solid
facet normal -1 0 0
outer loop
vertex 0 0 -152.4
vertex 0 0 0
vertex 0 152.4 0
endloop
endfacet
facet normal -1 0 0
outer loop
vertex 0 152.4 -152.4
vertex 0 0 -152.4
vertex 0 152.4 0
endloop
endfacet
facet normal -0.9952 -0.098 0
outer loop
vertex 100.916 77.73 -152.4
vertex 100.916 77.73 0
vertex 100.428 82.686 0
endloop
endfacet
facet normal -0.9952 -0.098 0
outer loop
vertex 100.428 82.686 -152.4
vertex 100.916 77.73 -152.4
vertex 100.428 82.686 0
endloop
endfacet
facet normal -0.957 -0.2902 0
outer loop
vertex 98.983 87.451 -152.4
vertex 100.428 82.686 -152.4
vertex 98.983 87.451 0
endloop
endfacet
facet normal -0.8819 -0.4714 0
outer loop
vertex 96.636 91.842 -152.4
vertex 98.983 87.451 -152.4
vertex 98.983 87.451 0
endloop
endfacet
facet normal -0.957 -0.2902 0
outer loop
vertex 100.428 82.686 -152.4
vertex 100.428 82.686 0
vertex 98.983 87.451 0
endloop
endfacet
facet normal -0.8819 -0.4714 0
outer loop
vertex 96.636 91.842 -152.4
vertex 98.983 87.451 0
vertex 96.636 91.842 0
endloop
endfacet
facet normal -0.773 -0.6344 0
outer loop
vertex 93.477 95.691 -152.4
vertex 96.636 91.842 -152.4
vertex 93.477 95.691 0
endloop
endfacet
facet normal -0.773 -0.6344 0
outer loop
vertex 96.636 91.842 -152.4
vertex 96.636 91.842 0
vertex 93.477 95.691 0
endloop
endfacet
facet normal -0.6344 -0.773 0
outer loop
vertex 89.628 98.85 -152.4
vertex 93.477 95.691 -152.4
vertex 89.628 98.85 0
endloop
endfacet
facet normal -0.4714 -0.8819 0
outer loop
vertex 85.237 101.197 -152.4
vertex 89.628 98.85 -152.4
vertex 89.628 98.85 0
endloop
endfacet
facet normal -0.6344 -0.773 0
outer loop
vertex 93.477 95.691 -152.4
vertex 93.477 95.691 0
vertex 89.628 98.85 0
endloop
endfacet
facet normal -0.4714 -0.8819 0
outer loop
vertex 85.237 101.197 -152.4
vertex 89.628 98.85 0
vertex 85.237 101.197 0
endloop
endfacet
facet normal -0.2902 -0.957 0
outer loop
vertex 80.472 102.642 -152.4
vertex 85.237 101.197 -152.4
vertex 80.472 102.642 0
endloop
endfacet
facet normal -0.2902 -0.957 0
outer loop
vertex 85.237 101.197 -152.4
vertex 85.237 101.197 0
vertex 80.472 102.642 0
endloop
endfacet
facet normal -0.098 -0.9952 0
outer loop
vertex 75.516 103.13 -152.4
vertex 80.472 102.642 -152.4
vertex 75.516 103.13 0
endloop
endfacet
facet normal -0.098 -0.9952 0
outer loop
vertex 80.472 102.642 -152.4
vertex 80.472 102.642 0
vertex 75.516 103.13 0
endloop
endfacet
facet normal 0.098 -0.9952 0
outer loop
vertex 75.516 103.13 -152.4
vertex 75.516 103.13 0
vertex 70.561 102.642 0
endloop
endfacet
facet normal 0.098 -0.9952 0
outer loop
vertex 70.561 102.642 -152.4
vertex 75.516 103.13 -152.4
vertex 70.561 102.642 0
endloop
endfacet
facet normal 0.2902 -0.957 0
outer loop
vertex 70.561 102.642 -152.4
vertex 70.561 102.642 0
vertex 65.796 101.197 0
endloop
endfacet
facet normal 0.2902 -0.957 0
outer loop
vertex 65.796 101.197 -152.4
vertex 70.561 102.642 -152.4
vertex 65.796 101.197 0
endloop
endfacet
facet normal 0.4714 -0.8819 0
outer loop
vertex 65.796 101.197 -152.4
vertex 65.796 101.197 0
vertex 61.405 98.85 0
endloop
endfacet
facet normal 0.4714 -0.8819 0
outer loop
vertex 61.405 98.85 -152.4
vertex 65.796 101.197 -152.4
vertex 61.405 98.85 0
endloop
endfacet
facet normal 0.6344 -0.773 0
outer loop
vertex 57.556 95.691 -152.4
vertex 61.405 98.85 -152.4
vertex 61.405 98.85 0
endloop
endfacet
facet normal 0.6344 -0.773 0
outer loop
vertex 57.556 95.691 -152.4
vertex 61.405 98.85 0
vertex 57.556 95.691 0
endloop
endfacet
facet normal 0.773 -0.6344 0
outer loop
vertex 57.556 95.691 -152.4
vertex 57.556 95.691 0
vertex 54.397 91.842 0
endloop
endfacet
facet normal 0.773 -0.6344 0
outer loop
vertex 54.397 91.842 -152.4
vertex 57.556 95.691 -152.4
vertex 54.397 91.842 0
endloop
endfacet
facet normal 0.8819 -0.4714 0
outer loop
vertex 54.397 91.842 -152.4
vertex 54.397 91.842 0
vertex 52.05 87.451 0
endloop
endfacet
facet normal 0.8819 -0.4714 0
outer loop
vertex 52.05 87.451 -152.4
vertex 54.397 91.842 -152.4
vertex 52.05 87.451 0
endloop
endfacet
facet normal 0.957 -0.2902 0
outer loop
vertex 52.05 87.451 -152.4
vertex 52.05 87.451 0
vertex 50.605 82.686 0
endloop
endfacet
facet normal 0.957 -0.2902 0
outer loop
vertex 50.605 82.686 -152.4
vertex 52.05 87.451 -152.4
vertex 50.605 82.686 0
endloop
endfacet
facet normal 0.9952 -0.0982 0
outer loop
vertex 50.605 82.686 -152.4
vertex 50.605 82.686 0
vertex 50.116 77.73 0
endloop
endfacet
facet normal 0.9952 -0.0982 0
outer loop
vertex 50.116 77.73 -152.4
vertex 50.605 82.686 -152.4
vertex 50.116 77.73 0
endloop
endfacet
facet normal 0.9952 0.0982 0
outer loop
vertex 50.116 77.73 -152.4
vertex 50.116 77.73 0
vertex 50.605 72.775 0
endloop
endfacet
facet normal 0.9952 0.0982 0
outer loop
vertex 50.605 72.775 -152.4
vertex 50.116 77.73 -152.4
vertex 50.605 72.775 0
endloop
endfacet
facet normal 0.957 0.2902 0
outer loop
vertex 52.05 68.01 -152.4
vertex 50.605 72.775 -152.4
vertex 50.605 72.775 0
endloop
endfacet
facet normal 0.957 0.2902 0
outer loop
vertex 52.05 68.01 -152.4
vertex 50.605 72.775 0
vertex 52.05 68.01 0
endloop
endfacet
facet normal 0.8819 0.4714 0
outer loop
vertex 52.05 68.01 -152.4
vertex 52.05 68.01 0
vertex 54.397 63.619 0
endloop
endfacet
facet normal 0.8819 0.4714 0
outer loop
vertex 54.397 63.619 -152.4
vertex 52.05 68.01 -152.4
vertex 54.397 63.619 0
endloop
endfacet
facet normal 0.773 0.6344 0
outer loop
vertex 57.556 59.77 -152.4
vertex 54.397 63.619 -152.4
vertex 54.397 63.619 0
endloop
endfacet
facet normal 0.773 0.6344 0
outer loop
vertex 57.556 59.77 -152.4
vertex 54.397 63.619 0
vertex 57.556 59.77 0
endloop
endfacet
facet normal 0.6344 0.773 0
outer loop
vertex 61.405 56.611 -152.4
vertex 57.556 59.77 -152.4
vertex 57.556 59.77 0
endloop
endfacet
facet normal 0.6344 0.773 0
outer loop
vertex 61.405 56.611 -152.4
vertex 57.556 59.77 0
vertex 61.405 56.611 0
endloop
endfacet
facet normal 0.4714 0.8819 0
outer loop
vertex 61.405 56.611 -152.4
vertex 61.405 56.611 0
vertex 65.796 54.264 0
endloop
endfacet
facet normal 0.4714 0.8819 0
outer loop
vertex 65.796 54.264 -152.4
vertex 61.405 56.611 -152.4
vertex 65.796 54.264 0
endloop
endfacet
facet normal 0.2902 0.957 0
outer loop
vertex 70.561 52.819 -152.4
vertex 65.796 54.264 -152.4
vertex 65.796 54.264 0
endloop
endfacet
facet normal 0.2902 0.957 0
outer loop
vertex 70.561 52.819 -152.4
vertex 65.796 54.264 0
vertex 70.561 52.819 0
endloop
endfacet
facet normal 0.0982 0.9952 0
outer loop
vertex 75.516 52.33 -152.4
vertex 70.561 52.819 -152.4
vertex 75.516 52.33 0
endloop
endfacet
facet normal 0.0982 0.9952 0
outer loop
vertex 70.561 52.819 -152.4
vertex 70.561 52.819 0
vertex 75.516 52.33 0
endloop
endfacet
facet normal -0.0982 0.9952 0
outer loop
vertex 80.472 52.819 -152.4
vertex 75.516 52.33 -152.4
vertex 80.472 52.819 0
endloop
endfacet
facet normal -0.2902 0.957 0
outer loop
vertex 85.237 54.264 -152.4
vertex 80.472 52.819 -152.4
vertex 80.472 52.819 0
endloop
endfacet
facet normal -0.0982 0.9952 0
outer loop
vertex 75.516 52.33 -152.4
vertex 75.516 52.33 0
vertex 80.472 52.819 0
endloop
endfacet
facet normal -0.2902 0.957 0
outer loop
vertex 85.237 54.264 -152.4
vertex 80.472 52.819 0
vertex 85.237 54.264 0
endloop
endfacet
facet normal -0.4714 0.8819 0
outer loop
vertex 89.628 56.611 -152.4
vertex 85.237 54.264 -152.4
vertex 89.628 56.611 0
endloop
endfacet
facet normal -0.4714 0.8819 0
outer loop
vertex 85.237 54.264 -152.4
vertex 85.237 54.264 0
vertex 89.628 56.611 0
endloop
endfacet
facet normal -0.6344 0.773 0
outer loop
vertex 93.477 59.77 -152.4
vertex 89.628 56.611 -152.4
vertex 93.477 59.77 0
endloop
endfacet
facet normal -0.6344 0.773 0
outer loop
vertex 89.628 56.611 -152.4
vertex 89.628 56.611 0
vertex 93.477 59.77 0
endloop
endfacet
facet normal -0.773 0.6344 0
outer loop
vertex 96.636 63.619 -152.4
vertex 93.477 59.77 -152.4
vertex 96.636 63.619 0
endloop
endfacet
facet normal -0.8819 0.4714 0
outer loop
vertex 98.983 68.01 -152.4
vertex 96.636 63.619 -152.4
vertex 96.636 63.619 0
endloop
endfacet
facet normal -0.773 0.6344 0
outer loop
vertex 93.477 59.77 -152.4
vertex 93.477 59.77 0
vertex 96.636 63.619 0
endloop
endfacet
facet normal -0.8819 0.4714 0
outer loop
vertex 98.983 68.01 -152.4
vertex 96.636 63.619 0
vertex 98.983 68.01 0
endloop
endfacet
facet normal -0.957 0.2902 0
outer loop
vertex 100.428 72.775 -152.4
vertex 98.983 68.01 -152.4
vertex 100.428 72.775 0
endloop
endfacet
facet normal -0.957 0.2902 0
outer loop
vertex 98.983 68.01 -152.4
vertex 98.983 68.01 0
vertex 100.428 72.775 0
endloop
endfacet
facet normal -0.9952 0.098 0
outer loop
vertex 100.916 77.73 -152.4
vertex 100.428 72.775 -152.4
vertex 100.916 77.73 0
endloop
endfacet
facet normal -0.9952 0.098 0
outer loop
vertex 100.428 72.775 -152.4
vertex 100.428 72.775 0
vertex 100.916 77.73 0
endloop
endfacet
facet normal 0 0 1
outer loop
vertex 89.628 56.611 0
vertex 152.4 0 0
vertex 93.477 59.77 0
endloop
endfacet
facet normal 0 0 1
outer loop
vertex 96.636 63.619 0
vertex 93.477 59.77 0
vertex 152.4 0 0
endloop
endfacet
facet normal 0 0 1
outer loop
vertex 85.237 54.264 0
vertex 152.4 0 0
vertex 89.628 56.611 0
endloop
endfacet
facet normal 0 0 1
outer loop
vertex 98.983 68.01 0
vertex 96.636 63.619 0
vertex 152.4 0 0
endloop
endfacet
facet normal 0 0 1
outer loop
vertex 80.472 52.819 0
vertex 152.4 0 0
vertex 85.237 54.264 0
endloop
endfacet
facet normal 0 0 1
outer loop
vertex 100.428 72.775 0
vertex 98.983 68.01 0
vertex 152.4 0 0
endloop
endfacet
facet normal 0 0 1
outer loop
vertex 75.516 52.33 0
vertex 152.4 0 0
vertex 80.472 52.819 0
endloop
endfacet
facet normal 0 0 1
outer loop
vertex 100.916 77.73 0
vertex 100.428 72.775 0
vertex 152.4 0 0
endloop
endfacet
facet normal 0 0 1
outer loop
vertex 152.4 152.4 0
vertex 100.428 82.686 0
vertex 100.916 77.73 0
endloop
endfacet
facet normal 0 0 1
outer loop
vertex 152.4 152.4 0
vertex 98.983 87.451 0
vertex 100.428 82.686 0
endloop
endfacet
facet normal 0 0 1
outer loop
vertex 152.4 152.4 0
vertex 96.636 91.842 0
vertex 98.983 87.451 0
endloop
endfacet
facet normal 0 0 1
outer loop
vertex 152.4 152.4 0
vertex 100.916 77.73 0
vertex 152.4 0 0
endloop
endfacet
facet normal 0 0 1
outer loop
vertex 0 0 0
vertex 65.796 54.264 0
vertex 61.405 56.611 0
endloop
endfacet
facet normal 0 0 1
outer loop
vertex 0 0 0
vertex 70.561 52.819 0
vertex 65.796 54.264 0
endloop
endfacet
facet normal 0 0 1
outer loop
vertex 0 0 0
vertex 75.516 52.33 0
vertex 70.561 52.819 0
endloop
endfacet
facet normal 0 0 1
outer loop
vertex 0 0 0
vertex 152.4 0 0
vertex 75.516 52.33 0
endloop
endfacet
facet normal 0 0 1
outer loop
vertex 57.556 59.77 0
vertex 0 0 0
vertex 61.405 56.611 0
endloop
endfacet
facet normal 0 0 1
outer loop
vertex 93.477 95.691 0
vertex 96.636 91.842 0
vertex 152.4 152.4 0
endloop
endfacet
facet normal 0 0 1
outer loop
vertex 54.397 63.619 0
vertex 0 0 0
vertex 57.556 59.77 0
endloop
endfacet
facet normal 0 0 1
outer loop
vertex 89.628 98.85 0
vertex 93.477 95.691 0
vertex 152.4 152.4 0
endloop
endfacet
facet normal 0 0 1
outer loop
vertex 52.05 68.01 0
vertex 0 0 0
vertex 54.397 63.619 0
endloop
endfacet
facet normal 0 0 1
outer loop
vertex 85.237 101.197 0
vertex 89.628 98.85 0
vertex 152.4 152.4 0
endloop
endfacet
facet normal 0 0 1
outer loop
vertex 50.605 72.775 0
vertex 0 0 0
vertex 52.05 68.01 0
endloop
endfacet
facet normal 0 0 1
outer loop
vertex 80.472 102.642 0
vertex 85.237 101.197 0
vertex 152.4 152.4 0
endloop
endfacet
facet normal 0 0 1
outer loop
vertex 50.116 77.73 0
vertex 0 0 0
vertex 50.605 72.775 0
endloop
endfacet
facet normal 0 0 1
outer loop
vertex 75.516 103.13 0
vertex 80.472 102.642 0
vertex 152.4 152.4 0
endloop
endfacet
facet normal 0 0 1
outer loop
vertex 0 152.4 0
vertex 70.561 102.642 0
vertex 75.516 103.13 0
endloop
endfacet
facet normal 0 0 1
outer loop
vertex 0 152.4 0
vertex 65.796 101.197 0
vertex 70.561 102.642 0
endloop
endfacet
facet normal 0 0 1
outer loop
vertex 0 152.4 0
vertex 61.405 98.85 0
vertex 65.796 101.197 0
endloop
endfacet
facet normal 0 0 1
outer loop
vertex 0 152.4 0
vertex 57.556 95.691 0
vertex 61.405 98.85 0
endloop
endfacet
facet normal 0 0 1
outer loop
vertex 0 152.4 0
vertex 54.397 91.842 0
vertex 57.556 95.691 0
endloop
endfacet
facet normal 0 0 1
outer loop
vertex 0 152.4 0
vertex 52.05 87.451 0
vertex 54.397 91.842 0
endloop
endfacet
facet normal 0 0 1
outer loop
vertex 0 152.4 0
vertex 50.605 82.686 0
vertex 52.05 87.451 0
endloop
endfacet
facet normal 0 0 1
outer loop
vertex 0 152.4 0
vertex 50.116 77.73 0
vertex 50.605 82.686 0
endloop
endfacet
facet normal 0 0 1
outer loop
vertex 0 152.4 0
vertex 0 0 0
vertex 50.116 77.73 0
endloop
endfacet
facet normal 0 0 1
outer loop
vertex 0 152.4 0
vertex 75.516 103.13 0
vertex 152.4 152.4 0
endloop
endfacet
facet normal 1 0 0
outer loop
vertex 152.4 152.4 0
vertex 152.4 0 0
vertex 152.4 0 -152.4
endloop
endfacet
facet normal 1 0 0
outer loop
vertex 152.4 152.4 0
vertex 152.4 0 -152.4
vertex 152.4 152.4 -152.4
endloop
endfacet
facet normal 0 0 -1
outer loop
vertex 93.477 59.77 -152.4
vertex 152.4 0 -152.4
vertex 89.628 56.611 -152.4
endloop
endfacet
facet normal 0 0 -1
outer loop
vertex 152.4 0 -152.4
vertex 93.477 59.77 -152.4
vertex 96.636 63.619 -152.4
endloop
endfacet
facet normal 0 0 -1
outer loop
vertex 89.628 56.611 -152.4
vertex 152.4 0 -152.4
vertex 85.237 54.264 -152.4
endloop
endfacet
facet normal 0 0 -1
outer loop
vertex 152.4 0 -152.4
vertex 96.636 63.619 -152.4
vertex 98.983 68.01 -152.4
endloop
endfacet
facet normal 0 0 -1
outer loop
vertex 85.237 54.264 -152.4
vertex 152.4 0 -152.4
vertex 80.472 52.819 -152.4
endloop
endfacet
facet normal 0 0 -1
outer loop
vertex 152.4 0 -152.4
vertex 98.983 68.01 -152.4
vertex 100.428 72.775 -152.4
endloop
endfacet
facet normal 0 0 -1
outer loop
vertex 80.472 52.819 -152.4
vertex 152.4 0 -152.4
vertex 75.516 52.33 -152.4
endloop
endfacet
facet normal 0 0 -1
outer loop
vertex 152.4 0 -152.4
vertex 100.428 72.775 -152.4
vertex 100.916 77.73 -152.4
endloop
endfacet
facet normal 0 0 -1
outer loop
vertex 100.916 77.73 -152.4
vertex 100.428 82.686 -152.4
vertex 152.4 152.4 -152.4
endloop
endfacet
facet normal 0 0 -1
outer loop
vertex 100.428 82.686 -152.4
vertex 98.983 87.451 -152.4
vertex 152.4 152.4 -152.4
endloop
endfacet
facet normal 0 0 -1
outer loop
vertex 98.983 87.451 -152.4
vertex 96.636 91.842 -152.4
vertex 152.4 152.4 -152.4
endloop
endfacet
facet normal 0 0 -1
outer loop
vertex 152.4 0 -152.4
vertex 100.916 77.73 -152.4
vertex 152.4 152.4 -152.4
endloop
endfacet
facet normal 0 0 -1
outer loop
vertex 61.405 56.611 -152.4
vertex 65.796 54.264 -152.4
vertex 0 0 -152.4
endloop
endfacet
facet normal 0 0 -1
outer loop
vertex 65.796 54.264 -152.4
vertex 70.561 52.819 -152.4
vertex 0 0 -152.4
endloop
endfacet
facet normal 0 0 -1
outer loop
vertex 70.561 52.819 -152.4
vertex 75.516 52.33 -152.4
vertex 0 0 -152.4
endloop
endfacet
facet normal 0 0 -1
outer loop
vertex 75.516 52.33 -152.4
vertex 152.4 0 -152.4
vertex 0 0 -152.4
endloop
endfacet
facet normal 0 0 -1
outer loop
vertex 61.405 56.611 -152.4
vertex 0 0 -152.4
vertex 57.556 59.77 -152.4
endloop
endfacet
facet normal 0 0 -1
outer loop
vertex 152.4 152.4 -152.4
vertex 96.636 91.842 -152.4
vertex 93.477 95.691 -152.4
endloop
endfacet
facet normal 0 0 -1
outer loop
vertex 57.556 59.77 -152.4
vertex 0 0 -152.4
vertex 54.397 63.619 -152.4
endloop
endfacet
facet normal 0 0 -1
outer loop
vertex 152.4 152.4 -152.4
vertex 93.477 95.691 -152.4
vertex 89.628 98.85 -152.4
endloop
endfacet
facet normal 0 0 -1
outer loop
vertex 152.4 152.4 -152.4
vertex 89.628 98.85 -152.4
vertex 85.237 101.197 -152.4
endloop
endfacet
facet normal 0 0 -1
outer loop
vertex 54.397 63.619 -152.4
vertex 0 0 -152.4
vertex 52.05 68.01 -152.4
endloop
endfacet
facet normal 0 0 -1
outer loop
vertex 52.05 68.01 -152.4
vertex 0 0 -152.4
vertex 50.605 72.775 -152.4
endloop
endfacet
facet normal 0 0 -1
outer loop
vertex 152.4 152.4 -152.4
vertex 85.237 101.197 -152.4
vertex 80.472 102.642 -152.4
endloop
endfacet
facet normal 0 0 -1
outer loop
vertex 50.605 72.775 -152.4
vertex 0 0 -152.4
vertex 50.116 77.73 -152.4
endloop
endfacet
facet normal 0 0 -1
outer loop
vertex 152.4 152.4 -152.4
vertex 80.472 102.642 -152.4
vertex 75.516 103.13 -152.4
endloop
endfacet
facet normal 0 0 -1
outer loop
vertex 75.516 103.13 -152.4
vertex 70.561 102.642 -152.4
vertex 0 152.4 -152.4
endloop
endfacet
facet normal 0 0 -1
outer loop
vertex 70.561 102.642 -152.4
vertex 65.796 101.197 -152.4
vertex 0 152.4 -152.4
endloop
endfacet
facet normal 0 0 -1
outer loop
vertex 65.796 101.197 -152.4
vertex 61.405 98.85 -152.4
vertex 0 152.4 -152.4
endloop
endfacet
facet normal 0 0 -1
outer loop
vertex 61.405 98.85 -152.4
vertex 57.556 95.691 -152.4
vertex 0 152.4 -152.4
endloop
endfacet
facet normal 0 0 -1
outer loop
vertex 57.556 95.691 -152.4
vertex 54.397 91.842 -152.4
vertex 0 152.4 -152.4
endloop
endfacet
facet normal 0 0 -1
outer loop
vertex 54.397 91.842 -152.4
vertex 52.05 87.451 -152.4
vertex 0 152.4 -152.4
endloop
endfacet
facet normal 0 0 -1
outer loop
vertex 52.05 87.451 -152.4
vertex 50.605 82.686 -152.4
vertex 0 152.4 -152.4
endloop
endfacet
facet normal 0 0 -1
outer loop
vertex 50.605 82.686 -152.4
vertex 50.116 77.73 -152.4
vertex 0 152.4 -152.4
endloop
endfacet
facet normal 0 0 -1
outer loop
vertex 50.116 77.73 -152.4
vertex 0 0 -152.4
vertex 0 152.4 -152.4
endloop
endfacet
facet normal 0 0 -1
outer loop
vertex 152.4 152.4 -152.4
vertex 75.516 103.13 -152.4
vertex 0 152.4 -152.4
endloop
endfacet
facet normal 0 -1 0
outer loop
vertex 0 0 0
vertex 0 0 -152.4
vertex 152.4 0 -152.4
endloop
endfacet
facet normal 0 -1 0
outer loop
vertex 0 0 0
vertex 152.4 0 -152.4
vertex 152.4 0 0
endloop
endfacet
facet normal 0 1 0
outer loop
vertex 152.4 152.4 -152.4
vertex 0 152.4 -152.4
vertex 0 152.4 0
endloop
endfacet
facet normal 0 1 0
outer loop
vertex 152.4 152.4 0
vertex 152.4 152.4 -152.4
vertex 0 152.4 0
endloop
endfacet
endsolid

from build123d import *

# Parameters (mm, degrees)
F0_W     = 152.4
F0_H     = 152.4
F1_DEPTH = 152.4
F2_R     = 25.4
F3_DEPTH = 152.401


with BuildPart() as f1:
    # F0 (on Right) → F1 (new body)
    with BuildSketch(Plane.YZ):
        with Locations((76.2, -76.2)):
            Rectangle(F0_W, F0_H)
    extrude(amount=F1_DEPTH)

    # F2 (on face) → F3 (cut, through all)
    with BuildSketch(Plane.XY):
        with Locations((75.516477, 77.730492)):
            Circle(F2_R)
    extrude(amount=-F3_DEPTH, mode=Mode.SUBTRACT)


solid = f1.part
